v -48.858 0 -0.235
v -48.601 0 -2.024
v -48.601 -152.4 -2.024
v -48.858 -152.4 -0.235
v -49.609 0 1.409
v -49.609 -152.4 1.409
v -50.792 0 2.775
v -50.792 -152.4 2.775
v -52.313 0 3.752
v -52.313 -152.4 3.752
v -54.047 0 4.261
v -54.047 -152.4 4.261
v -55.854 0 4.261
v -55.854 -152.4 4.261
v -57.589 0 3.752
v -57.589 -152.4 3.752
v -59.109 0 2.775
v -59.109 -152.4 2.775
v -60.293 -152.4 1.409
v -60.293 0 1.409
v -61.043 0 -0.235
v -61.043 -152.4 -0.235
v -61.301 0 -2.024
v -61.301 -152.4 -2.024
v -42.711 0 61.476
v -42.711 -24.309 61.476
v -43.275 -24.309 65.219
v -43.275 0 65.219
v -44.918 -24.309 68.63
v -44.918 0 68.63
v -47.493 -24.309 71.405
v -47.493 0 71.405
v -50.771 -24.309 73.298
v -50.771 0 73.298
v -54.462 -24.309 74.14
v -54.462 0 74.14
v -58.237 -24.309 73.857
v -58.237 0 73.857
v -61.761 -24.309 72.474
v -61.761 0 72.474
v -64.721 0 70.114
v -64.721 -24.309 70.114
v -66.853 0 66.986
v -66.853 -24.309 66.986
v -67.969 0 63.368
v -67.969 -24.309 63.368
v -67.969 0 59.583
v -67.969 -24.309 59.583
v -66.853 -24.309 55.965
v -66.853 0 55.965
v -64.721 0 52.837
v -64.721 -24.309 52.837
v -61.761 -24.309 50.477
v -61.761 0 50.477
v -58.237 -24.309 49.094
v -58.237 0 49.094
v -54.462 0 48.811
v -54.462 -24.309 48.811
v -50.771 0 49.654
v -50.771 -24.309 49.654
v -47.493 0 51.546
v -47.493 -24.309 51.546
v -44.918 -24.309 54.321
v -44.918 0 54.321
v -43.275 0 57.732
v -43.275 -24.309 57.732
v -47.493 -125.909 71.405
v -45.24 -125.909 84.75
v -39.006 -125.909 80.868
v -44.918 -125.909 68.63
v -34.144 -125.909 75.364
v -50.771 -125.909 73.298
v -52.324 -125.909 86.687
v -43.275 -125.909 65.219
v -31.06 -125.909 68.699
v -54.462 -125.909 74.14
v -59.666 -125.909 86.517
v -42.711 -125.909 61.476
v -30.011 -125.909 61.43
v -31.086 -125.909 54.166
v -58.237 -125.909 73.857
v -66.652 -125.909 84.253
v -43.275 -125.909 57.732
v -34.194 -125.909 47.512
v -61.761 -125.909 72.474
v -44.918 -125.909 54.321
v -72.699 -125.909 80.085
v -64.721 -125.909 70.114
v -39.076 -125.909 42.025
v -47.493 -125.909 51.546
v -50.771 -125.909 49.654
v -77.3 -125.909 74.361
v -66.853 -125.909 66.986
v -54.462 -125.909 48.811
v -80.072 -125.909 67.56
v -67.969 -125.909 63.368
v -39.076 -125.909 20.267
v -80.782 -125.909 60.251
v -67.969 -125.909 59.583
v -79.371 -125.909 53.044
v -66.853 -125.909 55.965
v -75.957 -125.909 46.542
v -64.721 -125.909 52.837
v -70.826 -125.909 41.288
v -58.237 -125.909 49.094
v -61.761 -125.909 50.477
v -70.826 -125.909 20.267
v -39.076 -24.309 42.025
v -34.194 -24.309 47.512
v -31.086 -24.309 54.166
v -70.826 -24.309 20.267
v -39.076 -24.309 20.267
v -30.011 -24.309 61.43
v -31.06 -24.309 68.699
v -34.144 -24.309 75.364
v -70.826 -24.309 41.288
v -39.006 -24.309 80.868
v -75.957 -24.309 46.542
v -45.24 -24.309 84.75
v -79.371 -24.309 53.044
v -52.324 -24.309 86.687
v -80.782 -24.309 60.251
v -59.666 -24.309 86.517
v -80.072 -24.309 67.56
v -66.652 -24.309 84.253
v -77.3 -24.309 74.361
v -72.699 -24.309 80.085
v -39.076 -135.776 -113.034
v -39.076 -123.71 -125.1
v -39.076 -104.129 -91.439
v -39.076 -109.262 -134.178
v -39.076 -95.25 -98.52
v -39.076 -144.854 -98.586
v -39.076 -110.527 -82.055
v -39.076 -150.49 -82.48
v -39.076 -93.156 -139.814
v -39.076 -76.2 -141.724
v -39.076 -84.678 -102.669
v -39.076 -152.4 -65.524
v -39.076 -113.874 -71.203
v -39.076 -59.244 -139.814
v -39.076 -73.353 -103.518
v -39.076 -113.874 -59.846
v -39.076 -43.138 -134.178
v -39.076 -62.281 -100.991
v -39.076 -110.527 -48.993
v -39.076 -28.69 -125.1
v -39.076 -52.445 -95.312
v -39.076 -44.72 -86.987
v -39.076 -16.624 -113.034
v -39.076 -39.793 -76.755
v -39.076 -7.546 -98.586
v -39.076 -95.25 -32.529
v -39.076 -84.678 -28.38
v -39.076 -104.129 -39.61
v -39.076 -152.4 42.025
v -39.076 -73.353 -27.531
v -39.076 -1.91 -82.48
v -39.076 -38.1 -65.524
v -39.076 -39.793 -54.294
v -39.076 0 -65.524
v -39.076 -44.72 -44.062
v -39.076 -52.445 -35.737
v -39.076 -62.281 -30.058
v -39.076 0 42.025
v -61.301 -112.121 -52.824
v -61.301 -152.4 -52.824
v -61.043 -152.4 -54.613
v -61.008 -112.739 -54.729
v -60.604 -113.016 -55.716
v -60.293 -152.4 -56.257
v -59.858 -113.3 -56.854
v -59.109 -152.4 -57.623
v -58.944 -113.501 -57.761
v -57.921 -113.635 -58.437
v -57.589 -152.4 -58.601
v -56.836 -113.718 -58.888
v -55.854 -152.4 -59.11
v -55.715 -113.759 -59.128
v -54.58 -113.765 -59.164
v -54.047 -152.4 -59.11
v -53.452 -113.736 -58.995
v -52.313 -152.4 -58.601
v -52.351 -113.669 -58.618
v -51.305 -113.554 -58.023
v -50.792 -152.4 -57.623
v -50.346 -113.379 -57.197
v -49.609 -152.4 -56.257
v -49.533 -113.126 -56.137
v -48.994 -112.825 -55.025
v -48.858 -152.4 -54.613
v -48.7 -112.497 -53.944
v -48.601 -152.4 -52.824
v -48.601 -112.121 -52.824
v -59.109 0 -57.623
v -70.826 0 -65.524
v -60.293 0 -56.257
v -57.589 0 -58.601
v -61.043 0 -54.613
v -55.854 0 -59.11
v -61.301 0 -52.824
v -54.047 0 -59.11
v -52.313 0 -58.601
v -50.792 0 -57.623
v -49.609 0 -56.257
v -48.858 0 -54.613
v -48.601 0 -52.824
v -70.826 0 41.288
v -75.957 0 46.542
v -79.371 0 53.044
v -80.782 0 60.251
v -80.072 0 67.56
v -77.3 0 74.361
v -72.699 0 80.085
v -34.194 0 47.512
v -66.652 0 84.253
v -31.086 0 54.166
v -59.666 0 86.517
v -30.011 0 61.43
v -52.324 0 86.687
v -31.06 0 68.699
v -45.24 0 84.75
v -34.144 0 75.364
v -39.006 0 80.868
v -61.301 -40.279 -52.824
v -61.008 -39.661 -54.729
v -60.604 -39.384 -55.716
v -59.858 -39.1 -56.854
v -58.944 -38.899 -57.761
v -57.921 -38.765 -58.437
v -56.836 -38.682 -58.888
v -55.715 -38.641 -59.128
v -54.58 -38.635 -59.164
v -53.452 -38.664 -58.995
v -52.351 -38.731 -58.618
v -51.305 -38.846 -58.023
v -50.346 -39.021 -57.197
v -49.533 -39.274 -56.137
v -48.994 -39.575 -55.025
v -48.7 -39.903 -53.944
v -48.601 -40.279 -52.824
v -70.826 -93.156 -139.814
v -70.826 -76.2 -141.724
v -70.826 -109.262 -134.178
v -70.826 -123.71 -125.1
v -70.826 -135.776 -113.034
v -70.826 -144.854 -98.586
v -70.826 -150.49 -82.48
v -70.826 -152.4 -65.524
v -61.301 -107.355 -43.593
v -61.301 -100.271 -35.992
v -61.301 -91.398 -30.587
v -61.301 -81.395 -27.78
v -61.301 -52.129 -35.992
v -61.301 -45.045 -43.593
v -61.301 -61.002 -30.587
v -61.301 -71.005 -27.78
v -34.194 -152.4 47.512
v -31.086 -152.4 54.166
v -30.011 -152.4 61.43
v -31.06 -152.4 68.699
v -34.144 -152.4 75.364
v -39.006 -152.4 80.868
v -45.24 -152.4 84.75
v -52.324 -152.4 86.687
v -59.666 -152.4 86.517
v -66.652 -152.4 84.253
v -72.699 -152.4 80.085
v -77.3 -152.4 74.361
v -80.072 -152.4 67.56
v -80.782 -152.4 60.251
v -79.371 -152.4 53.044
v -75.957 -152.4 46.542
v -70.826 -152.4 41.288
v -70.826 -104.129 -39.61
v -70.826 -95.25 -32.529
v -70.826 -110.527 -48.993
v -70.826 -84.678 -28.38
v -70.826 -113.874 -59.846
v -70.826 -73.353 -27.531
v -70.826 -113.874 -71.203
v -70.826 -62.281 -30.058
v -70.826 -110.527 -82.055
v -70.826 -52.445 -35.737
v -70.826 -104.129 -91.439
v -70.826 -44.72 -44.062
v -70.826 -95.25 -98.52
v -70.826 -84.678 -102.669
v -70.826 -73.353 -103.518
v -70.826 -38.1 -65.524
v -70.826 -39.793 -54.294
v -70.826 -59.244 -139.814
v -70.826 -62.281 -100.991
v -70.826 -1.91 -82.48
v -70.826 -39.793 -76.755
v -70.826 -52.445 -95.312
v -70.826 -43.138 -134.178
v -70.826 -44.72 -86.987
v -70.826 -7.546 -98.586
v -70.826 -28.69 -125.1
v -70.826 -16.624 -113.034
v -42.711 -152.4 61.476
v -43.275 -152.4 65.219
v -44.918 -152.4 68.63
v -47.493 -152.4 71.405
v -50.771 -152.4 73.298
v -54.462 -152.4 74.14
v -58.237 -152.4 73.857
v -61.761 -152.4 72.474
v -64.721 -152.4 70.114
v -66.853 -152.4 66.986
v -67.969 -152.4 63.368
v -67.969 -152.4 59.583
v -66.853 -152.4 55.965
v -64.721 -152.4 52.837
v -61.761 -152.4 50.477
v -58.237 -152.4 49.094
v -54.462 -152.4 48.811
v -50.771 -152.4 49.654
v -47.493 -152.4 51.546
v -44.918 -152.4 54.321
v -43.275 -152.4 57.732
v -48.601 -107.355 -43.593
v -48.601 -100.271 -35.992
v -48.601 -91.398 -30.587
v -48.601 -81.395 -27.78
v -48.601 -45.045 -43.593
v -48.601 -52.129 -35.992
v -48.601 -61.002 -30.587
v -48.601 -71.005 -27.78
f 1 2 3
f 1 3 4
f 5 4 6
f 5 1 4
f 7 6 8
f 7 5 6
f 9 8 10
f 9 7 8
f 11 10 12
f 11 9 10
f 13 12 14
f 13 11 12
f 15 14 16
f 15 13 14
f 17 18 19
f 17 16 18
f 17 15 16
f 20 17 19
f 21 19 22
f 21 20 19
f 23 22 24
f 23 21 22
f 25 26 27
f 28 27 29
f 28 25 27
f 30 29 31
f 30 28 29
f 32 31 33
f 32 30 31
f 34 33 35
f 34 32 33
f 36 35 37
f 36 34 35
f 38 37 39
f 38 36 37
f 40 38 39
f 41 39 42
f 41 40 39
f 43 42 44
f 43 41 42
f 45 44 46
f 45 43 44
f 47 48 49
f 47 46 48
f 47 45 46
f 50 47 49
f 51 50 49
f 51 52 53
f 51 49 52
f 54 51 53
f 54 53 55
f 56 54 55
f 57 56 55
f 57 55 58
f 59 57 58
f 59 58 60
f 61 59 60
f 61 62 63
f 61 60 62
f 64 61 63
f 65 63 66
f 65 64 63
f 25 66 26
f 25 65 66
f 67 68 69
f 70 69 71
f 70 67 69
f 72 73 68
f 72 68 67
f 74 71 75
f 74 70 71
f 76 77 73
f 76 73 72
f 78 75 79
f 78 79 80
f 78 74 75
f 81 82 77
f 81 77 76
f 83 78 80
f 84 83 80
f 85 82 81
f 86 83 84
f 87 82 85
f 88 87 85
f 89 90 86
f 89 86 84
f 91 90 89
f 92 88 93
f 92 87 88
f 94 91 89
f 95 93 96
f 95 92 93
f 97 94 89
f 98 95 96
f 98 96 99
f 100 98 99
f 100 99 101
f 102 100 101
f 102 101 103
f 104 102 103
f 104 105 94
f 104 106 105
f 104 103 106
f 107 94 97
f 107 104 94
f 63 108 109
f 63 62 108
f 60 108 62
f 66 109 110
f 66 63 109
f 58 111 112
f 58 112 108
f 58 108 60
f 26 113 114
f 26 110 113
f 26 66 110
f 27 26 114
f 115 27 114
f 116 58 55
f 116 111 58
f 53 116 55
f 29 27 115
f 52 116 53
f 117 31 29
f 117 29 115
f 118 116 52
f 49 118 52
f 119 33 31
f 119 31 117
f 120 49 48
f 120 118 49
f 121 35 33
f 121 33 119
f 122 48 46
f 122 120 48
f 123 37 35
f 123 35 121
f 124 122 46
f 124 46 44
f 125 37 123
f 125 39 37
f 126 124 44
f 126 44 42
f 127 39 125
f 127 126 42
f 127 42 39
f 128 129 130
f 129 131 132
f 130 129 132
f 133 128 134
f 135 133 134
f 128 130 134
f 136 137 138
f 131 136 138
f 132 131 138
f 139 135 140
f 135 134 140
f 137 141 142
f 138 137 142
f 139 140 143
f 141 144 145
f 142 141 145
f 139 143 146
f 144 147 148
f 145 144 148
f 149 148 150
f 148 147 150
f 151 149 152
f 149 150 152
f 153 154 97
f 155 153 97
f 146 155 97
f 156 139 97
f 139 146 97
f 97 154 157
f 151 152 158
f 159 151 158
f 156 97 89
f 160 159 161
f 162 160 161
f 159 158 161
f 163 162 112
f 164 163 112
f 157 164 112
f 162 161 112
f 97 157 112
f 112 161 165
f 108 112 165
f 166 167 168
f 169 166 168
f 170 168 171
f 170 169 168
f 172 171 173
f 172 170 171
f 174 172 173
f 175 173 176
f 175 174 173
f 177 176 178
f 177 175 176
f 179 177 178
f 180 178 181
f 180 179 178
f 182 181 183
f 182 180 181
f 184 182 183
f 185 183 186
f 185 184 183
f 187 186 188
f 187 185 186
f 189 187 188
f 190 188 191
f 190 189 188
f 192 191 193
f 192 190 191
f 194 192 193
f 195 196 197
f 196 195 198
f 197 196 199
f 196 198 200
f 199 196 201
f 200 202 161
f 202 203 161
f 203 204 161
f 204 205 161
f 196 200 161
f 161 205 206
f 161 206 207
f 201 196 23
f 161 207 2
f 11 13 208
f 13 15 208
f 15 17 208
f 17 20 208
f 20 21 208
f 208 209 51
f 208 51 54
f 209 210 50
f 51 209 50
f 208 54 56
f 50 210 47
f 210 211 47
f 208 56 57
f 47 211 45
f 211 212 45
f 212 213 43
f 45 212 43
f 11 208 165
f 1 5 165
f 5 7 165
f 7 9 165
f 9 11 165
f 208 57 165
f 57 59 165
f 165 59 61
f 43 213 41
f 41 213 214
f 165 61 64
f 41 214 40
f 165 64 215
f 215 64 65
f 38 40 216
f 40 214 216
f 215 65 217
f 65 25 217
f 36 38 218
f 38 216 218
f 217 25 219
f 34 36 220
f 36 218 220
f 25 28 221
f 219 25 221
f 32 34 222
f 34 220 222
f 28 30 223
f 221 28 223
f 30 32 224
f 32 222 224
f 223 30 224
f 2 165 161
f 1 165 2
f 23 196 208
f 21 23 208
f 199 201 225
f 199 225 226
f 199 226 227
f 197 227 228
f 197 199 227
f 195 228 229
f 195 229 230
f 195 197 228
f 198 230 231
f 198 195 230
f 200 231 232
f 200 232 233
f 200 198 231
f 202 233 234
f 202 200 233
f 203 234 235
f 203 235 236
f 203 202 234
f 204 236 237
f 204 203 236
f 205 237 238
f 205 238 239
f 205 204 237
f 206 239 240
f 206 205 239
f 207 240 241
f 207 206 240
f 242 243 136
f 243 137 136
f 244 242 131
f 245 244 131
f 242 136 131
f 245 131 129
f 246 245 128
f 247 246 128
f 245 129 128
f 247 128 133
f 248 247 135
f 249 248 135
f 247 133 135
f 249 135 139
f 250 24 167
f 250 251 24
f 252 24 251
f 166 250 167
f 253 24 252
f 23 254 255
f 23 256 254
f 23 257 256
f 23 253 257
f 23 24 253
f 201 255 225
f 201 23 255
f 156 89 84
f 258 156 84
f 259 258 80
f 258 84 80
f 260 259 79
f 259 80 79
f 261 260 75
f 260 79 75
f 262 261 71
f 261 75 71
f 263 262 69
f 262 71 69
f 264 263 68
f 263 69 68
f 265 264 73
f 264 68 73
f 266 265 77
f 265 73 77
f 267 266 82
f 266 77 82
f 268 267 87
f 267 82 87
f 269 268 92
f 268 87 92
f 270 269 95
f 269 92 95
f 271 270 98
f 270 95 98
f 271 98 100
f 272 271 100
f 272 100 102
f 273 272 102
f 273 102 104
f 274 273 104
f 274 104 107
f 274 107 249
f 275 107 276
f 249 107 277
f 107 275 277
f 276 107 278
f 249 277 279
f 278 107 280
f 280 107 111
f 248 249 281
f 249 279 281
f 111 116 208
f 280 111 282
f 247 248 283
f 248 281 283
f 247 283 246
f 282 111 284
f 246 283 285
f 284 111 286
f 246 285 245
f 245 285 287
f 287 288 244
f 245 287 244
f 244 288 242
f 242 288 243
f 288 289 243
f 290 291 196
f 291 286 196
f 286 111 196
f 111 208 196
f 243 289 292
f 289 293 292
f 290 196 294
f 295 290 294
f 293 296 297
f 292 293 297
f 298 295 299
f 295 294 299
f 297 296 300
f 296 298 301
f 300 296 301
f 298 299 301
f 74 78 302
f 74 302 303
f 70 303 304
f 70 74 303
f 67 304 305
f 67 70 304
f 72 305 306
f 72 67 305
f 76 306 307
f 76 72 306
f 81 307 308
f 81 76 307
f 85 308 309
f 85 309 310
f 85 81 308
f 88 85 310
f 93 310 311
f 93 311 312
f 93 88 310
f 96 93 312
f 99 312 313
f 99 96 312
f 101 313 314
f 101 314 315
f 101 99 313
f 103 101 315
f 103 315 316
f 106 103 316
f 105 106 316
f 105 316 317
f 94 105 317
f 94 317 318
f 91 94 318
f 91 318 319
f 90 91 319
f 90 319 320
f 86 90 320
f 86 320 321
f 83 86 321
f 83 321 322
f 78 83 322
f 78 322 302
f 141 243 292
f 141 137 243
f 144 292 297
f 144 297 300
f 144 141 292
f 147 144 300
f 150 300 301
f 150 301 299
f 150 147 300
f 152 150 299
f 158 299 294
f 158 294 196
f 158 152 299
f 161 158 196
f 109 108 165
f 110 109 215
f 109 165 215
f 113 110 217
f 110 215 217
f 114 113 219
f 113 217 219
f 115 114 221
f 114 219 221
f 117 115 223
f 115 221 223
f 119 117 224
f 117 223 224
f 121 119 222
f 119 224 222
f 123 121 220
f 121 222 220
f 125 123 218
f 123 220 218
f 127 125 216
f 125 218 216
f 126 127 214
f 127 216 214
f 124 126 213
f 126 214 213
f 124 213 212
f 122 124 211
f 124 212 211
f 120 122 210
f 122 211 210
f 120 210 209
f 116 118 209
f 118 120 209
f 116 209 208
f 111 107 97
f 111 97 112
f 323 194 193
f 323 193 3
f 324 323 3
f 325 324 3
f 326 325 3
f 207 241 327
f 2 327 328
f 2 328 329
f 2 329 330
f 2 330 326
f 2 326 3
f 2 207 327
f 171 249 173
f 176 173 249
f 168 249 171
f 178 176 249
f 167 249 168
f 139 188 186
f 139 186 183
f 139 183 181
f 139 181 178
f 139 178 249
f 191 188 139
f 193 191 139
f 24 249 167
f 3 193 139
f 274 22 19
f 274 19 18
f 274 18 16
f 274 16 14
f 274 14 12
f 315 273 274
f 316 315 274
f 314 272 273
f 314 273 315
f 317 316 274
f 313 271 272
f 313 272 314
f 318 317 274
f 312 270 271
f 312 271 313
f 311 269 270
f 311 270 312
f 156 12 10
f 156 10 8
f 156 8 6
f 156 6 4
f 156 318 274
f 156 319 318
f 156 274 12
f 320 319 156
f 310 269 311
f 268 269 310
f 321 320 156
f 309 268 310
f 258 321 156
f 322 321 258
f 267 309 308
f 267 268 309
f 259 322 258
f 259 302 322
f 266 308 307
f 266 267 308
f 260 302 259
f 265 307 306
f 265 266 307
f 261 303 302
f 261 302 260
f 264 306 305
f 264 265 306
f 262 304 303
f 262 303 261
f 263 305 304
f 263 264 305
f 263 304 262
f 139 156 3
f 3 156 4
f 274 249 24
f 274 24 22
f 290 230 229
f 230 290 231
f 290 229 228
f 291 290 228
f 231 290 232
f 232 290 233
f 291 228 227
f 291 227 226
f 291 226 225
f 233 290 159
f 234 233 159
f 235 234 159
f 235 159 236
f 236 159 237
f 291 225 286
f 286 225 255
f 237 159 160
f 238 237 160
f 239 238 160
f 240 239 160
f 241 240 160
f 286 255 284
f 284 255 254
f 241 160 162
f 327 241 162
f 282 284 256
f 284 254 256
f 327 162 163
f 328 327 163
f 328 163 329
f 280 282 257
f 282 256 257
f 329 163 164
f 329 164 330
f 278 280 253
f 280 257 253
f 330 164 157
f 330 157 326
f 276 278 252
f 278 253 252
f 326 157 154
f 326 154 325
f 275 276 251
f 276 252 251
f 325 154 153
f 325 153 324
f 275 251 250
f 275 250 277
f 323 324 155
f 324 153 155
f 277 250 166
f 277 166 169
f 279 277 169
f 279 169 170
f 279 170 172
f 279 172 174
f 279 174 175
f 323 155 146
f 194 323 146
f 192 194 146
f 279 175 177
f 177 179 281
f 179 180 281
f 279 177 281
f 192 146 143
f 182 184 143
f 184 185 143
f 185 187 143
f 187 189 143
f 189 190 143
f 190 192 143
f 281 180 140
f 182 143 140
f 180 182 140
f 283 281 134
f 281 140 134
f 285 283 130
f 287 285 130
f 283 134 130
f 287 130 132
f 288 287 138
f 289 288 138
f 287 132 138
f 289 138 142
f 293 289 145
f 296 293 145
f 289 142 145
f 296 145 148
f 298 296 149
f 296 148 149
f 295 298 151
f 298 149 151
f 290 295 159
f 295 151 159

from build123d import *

# Parameters (mm, degrees)
F0_R     = 12.7
F1_DEPTH = 152.4
F2_R     = 76.19999
F3_R     = 38.1
F4_DEPTH = 41.7364233324
F7_DEPTH = 96.9898923586
F8_DEPTH = 152.401


# Not quite as in the source:
# - a fillet or chamfer is up to 0.001 mm smaller than in the source, because OpenCascade refuses the exact size


with BuildPart() as f1:
    # F0 (on Front) → F1 (new body)
    with BuildSketch(Plane.XZ):
        with BuildLine():
            Line((-39.075684309, -141.72433921), (-39.075684309, 42.0253665879))
            ThreePointArc((-39.075684309, 42.0253665879), (-56.0010235987, 86.8688094558), (-70.825684309, 41.2877726846))
            Line((-70.825684309, 41.2877726846), (-70.825684309, -141.72433921))
            Line((-70.825684309, -141.72433921), (-39.075684309, -141.72433921))
        make_face()
        with Locations((-55.4111076414, 61.47566079)):
            Circle(F0_R, mode=Mode.SUBTRACT)
        with BuildLine():
            Line((-61.300684309, -52.82433921), (-61.300684309, -2.02433921))
            ThreePointArc((-61.300684309, -2.02433921), (-54.950684309, 4.32566079), (-48.600684309, -2.02433921))
            Line((-48.600684309, -2.02433921), (-48.600684309, -52.82433921))
            ThreePointArc((-48.600684309, -52.82433921), (-54.950684309, -59.17433921), (-61.300684309, -52.82433921))
        make_face(mode=Mode.SUBTRACT)
        with BuildLine():
            ThreePointArc((-48.600684309, -2.02433921), (-54.950684309, 4.32566079), (-61.300684309, -2.02433921))
            Line((-61.300684309, -2.02433921), (-61.300684309, -52.82433921))
            ThreePointArc((-61.300684309, -52.82433921), (-54.950684309, -59.17433921), (-48.600684309, -52.82433921))
            Line((-48.600684309, -52.82433921), (-48.600684309, -2.02433921))
        make_face()
    extrude(amount=F1_DEPTH)

    # F2 (radius 76.2 in the source; OpenCascade refuses exactly that, so slightly less here)
    f2_edges = [f1.edges().sort_by_distance(p)[0] for p in [
        (-54.950684, 0, -141.724339),
        (-54.950684, -152.4, -141.724339),
    ]]
    fillet(f2_edges, radius=F2_R)

    # F3 (on face) → F4 (cut, through all)
    with BuildSketch(Plane.YZ.offset(-39.075684309)):
        with Locations((-76.2, -65.52433921)):
            Circle(F3_R)
    extrude(amount=-F4_DEPTH, mode=Mode.SUBTRACT)

    # F6 (on offset) → F7 (cut, through all)
    with BuildSketch(Plane.YZ.offset(-127)):
        Polygon((-24.3093731642, 100.3912016645), (-125.9093731642, 96.466931504), (-125.9093731642, 20.266931504), (-24.3093731642, 20.266931504), align=None)
    extrude(amount=F7_DEPTH, mode=Mode.SUBTRACT)

    # F0 (on Front) → F8 (cut, through all)
    with BuildSketch(Plane.XZ):
        with BuildLine():
            ThreePointArc((-48.600684309, -2.02433921), (-54.950684309, 4.32566079), (-61.300684309, -2.02433921))
            Line((-61.300684309, -2.02433921), (-61.300684309, -52.82433921))
            ThreePointArc((-61.300684309, -52.82433921), (-54.950684309, -59.17433921), (-48.600684309, -52.82433921))
            Line((-48.600684309, -52.82433921), (-48.600684309, -2.02433921))
        make_face()
    extrude(amount=F8_DEPTH, mode=Mode.SUBTRACT)


solid = f1.part
